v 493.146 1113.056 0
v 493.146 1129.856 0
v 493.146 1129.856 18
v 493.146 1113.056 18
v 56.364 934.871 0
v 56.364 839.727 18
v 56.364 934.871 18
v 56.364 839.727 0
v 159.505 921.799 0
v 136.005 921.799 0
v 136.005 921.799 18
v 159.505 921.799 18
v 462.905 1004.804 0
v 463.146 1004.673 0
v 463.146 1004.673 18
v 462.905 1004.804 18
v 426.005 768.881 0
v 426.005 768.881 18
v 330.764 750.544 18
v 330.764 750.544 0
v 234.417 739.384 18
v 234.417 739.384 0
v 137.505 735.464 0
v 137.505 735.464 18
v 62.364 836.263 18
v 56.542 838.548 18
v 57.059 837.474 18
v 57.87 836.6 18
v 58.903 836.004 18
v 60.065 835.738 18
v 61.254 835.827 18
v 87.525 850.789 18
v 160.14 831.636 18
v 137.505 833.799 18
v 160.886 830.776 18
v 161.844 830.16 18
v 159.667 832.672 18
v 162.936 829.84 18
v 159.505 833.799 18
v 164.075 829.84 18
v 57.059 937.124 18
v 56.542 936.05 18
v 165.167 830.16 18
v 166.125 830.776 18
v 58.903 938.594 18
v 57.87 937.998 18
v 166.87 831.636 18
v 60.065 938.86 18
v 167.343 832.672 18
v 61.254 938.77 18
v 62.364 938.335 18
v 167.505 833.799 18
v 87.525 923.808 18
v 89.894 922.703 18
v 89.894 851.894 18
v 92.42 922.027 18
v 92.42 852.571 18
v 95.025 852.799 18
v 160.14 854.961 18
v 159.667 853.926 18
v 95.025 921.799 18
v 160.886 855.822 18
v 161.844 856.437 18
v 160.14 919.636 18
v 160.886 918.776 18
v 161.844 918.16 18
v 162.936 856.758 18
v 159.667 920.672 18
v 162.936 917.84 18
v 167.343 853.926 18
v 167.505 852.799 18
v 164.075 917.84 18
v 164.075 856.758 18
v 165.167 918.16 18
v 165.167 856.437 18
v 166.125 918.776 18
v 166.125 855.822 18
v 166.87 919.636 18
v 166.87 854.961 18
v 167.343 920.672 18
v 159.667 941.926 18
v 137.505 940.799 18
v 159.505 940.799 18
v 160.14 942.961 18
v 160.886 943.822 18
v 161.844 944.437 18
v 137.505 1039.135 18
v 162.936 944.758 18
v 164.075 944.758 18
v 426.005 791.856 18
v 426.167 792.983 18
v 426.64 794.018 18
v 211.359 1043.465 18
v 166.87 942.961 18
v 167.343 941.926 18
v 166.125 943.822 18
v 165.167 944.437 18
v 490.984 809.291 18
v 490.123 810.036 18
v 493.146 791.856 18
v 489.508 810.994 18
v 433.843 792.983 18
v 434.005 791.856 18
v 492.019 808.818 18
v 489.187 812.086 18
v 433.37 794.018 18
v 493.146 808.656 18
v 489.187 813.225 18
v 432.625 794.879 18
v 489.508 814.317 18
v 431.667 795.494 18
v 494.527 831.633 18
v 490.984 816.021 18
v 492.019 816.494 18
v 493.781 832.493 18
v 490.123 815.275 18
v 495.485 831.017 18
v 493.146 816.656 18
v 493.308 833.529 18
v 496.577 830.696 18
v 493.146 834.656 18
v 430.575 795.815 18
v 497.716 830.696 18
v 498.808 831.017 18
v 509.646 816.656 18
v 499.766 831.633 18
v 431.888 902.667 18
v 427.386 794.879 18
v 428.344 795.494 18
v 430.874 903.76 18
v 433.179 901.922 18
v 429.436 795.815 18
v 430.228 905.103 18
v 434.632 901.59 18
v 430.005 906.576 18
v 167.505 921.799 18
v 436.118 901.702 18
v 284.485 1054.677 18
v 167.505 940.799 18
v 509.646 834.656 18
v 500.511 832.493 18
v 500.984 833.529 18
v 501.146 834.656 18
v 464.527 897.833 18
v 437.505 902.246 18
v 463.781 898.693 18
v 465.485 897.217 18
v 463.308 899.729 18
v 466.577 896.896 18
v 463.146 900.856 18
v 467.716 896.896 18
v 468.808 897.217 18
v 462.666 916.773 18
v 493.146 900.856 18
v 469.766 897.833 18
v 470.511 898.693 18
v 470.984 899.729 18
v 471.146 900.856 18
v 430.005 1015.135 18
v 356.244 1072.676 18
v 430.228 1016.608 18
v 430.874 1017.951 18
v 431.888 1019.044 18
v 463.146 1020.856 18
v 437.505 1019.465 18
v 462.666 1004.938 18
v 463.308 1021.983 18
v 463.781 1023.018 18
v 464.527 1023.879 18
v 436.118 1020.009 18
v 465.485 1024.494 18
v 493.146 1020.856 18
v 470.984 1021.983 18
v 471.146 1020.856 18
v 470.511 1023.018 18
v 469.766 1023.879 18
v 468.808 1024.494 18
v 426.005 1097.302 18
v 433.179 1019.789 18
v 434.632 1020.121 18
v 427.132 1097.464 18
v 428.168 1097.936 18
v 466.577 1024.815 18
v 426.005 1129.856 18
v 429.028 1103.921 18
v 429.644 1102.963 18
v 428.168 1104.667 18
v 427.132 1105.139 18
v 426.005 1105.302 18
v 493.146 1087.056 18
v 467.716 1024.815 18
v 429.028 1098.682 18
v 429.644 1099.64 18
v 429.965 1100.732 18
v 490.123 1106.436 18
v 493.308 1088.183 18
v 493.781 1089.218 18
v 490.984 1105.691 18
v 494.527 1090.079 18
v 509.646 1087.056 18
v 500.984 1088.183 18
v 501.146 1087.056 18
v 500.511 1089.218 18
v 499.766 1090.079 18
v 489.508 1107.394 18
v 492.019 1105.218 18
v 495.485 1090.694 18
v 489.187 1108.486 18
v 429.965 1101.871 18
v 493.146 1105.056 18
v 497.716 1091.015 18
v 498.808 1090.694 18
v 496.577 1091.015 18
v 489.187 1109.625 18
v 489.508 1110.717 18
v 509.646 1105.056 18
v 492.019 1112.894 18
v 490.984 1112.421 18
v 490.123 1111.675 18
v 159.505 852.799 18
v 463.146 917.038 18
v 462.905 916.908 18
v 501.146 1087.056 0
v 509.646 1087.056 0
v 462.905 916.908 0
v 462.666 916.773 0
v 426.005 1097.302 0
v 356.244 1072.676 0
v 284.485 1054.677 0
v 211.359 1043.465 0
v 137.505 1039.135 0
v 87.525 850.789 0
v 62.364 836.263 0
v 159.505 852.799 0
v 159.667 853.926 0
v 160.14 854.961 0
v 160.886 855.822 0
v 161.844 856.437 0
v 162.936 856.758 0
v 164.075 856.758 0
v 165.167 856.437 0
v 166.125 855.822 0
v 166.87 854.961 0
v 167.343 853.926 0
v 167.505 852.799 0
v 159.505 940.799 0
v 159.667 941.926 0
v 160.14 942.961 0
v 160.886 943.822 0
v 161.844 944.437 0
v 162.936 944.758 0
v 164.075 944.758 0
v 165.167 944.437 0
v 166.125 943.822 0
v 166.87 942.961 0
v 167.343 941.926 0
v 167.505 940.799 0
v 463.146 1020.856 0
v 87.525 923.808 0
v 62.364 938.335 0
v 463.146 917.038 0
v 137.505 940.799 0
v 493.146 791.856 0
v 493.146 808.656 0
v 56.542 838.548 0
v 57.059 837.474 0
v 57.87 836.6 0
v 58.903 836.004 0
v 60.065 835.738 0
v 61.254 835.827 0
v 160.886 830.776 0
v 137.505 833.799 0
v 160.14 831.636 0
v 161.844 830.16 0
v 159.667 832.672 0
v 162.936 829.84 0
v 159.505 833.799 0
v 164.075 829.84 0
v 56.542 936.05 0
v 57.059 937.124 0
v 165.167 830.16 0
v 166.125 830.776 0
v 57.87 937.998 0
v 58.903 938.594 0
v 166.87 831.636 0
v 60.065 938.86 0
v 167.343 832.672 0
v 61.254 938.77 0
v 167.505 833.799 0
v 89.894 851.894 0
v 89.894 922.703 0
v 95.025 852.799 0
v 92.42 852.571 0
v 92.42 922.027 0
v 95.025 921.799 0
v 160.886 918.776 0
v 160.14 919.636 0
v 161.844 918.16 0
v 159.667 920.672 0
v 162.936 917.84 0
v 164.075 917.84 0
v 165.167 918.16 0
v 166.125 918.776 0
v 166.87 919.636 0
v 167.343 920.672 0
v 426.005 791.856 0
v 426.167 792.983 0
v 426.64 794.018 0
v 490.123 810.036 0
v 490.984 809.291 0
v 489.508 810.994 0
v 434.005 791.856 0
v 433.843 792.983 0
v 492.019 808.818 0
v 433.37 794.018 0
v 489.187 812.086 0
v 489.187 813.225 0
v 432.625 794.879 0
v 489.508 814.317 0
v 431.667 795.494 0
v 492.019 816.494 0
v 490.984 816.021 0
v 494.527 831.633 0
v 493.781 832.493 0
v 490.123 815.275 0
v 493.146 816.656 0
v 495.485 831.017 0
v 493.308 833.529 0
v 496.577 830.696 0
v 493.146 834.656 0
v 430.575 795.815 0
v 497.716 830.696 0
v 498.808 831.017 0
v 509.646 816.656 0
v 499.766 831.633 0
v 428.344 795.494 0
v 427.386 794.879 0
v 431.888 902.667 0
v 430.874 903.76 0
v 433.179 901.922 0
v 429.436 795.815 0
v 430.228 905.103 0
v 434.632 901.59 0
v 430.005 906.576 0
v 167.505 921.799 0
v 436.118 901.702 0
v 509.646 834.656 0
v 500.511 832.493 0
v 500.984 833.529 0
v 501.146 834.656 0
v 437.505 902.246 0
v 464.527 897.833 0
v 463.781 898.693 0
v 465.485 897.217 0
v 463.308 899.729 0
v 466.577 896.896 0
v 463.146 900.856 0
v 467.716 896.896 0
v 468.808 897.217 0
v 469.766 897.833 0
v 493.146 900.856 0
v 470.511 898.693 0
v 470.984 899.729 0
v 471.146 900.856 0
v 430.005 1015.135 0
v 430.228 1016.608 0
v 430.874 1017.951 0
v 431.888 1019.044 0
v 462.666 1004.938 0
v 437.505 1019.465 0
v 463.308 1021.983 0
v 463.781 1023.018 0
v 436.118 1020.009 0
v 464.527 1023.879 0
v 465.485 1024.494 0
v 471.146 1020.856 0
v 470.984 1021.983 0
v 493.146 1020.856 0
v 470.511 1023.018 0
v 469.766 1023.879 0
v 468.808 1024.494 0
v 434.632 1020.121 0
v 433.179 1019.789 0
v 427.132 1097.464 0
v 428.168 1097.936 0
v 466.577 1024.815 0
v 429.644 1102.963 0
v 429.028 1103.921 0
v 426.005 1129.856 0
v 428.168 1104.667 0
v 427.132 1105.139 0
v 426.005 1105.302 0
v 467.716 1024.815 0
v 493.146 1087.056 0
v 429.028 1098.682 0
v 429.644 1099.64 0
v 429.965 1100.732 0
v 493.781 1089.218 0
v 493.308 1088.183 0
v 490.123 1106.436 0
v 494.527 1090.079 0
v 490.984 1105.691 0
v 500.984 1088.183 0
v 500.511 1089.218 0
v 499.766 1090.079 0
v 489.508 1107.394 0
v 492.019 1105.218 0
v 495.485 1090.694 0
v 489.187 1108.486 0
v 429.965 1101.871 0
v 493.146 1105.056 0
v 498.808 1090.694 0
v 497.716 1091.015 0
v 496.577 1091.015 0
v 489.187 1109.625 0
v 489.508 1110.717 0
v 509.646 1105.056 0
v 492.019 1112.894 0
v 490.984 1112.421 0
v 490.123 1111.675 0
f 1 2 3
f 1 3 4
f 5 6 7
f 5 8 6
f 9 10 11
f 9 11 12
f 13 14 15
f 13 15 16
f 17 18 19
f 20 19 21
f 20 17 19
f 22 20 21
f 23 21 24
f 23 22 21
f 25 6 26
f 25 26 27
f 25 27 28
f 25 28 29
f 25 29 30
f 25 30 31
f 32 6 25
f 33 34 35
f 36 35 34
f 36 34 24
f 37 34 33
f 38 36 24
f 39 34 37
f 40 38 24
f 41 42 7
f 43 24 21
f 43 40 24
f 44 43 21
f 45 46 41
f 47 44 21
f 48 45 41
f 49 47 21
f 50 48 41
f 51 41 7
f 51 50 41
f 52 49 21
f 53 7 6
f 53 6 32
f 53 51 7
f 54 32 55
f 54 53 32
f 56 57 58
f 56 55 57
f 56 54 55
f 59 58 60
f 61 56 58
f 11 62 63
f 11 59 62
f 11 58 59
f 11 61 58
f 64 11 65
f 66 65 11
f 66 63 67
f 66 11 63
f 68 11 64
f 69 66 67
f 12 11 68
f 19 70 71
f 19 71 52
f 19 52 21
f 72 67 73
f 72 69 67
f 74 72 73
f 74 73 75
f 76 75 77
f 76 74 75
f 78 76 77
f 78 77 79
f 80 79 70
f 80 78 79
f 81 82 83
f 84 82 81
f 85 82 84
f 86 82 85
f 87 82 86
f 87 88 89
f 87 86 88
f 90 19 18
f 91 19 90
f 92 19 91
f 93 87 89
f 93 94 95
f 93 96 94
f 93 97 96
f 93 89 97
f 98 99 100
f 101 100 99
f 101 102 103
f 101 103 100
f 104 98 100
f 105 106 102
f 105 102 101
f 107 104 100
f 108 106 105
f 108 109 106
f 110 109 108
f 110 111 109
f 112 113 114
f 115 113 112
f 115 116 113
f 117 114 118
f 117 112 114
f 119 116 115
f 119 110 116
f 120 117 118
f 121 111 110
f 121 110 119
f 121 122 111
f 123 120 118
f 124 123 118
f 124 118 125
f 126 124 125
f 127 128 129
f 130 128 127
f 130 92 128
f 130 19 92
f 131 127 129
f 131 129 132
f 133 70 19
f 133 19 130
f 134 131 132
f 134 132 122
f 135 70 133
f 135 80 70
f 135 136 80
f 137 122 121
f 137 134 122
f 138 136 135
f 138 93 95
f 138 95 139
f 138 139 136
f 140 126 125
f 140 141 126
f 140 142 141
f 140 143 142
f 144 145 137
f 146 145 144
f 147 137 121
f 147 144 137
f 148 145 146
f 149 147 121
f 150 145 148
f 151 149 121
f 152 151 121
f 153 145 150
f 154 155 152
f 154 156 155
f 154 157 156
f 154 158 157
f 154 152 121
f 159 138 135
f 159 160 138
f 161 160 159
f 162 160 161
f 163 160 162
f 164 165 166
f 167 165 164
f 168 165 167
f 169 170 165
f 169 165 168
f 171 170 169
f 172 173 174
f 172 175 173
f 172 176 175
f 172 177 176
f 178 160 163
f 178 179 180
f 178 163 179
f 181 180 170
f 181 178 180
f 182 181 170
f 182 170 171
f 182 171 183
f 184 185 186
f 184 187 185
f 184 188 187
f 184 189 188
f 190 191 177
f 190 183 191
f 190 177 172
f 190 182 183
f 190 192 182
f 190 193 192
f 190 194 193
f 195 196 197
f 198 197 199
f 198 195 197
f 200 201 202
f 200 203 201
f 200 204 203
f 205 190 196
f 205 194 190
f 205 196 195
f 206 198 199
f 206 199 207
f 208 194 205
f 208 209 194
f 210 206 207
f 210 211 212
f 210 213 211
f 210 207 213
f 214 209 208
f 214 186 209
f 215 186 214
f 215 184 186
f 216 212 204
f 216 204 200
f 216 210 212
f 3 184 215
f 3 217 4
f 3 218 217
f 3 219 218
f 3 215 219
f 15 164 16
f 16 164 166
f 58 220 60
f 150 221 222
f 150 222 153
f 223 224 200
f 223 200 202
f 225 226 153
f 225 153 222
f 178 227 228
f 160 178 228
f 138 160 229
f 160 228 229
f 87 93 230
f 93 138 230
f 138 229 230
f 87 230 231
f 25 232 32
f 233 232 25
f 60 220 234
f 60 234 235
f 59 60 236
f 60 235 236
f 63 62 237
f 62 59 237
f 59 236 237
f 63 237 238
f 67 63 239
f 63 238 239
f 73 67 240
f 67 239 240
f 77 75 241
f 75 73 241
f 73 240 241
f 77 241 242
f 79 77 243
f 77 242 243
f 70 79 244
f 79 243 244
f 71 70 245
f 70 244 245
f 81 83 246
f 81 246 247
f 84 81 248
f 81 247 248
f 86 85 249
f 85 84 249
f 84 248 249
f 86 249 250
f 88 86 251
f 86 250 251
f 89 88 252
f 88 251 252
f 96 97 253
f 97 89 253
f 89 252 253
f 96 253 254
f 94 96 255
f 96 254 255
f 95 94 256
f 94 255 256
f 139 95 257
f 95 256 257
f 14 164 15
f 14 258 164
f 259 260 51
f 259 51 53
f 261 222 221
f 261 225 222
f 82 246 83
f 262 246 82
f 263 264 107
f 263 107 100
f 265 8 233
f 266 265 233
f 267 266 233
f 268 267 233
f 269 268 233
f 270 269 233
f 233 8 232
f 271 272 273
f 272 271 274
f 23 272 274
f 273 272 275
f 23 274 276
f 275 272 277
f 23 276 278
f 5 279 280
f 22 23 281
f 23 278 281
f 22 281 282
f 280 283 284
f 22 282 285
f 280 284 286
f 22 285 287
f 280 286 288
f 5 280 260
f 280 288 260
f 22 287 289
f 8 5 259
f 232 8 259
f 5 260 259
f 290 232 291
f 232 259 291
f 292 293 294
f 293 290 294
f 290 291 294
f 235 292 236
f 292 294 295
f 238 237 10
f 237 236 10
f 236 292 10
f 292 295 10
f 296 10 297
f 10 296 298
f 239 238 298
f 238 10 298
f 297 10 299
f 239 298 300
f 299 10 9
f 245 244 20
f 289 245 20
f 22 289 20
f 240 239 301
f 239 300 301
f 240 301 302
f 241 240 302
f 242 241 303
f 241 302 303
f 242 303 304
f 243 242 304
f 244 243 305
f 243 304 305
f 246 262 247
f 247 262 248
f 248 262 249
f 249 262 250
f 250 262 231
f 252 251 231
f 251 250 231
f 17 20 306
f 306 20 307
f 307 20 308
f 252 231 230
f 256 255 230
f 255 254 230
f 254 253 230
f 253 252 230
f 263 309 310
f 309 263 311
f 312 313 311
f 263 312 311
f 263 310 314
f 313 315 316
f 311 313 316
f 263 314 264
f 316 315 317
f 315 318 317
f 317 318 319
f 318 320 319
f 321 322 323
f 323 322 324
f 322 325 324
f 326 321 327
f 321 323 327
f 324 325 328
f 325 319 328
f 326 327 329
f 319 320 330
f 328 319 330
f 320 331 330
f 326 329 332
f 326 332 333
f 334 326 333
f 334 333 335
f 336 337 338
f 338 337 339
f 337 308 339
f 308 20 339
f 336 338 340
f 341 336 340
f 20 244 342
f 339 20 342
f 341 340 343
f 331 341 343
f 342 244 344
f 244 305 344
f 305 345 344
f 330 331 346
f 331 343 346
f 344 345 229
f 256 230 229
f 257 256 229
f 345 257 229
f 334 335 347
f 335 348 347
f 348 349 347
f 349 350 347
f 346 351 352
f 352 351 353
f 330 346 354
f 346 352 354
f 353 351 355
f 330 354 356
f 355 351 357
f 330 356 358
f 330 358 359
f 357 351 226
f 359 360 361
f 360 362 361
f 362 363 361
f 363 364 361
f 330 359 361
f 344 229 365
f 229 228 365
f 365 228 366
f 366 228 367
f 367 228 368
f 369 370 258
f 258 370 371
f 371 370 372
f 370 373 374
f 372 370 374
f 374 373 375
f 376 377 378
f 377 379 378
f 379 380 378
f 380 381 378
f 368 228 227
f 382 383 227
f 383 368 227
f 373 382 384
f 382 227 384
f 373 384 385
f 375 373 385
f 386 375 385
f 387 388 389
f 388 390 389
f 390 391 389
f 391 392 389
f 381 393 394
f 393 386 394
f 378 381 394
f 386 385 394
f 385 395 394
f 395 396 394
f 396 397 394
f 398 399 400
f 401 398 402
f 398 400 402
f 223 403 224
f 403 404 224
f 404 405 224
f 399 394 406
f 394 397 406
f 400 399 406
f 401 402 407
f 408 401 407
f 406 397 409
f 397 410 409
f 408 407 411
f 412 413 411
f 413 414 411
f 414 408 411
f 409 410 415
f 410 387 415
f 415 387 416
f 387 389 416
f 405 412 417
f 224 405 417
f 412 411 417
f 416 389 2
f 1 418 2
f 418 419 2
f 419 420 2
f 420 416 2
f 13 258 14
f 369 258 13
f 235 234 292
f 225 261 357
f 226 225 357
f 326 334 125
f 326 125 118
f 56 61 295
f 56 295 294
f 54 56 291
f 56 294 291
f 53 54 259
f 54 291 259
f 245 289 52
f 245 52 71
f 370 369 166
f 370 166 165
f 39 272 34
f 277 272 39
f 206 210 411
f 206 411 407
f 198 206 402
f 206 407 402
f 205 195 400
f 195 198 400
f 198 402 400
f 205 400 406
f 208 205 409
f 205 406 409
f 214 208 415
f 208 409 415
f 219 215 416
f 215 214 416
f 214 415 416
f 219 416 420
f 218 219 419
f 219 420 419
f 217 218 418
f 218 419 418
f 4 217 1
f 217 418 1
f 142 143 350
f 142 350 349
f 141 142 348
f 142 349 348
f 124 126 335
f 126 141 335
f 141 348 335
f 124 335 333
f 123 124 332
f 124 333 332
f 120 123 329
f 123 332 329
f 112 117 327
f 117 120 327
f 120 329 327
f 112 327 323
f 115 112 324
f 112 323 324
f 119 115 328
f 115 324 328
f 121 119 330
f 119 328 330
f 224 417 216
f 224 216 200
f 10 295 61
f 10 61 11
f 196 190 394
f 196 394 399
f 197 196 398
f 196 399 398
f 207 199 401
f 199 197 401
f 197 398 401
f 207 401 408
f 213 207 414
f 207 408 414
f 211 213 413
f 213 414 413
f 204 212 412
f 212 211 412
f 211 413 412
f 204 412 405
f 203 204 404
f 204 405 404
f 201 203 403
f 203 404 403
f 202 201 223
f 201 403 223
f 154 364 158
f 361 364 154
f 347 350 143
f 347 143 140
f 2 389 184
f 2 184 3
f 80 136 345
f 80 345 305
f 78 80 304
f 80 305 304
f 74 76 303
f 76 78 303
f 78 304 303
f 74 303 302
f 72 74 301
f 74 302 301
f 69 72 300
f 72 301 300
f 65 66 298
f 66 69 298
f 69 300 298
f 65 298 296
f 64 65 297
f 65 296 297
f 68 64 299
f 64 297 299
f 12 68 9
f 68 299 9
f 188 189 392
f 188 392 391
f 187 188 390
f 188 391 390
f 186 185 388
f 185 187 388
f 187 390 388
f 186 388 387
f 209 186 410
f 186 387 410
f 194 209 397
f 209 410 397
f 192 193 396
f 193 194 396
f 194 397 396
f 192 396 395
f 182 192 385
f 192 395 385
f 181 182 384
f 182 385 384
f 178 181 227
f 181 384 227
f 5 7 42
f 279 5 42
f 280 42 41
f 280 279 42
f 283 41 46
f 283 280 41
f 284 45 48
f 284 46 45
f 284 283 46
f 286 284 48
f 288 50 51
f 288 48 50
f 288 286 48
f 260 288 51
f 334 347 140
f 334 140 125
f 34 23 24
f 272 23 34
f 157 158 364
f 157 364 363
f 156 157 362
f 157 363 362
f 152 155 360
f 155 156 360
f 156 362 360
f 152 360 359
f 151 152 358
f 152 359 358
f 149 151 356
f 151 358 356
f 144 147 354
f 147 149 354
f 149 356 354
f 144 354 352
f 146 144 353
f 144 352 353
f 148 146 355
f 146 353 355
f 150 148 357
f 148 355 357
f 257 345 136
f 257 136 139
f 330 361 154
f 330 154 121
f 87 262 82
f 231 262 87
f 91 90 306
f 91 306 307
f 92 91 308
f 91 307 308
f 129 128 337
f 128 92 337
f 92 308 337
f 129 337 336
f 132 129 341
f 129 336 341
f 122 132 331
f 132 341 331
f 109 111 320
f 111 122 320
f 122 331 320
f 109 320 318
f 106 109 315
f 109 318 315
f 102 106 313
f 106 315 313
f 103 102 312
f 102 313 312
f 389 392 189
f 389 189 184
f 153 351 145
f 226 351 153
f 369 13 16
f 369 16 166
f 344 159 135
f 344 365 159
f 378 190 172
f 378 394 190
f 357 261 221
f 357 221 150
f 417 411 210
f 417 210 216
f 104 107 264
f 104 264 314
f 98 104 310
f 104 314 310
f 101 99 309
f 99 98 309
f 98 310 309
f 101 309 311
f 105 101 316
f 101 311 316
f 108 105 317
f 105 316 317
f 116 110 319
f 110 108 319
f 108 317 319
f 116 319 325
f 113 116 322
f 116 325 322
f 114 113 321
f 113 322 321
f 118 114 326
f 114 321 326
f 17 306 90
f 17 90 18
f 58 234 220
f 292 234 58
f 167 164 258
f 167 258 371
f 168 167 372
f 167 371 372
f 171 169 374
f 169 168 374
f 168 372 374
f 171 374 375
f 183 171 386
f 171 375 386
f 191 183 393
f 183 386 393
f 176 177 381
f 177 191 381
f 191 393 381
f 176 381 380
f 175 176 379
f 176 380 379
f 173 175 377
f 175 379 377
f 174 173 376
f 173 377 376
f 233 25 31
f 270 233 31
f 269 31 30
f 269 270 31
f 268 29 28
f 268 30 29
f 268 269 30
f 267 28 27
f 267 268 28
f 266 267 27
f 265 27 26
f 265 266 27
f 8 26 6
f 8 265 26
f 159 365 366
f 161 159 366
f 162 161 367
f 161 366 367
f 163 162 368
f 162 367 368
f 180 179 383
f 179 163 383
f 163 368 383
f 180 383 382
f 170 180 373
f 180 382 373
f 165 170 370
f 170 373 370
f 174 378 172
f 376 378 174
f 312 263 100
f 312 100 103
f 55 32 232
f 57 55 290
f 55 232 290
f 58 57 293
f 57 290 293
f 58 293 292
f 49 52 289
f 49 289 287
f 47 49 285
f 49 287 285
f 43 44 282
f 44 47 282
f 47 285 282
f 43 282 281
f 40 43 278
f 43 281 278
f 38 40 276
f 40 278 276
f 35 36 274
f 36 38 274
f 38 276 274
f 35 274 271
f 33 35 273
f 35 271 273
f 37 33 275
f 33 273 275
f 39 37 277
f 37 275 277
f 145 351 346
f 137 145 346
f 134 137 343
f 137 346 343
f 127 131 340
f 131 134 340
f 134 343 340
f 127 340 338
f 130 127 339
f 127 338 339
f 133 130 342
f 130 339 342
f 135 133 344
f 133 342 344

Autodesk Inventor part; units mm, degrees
ref_plane "YZ Plane" through (0, 0, 0) normal (1, 0, 0) x (0, 1, 0)
ref_plane "XZ Plane" through (0, 0, 0) normal (0, 1, 0) x (-1, 0, 0)
ref_plane "XY Plane" through (0, 0, 0) normal (0, 0, 1) x (1, 0, 0)
sketch "CONTOURS" plane through (0, 0, 0) normal (0, 0, 1) x (1, 0, 0)
  arc A0 (167.5054, 852.7989) -> (159.5054, 852.7989) centre (163.5054, 852.7989) ccw
  line L0 (159.5054, 852.7989) -> (95.0246, 852.7989)
  arc A1 (95.0246, 852.7989) -> (87.5246, 850.7893) centre (95.0246, 837.7989) ccw
  line L1 (87.5246, 850.7893) -> (62.3643, 836.263)
  arc A2 (56.3643, 839.7271) -> (62.3643, 836.263) centre (60.3643, 839.7271) ccw
  line L2 (56.3643, 839.7271) -> (56.3643, 934.8707)
  arc A3 (62.3643, 938.3348) -> (56.3643, 934.8707) centre (60.3643, 934.8707) ccw
  line L3 (62.3643, 938.3348) -> (87.5246, 923.8085)
  arc A4 (87.5246, 923.8085) -> (95.0246, 921.7989) centre (95.0246, 936.7989) ccw
  line L4 (95.0246, 921.7989) -> (136.0054, 921.7989)
  line L5 (136.0054, 921.7989) -> (159.5054, 921.7989)
  arc A5 (159.5054, 921.7989) -> (167.5054, 921.7989) centre (163.5054, 921.7989) ccw
  line L6 (167.5054, 921.7989) -> (167.5054, 940.7989)
  arc A6 (167.5054, 940.7989) -> (159.5054, 940.7989) centre (163.5054, 940.7989) ccw
  line L7 (159.5054, 940.7989) -> (137.5054, 940.7989)
  line L8 (137.5054, 940.7989) -> (137.5054, 1039.1352)
  arc A7 (137.5054, 1039.1352) -> (426.0054, 1097.3015) centre (128.2106, 1829.7885) ccw
  arc A8 (426.0054, 1097.3015) -> (426.0054, 1105.3015) centre (426.0054, 1101.3015) ccw
  line L9 (426.0054, 1105.3015) -> (426.0054, 1129.8557)
  line L10 (426.0054, 1129.8557) -> (493.1464, 1129.8556)
  line L11 (493.1464, 1129.8556) -> (493.1464, 1113.0556)
  arc A9 (493.1464, 1113.0556) -> (493.1464, 1105.0556) centre (493.1464, 1109.0556) ccw
  line L12 (493.1464, 1105.0556) -> (509.6464, 1105.0556)
  line L13 (509.6464, 1105.0556) -> (509.6464, 1087.0556)
  line L14 (509.6464, 1087.0556) -> (501.1464, 1087.0556)
  arc A10 (501.1464, 1087.0556) -> (493.1464, 1087.0556) centre (497.1464, 1087.0556) ccw
  line L15 (493.1464, 1087.0556) -> (493.1464, 1020.8556)
  line L16 (493.1464, 1020.8556) -> (471.1464, 1020.8556)
  arc A11 (471.1464, 1020.8556) -> (463.1464, 1020.8556) centre (467.1464, 1020.8556) ccw
  line L17 (463.1464, 1020.8556) -> (463.1464, 1004.6734)
  line L18 (463.1464, 1004.6734) -> (462.9047, 1004.8036)
  line L19 (462.9047, 1004.8036) -> (462.6656, 1004.9385)
  line L20 (462.6656, 1004.9385) -> (437.5054, 1019.4648)
  arc A12 (437.5054, 1019.4648) -> (430.0054, 1015.1347) centre (435.0054, 1015.1347) ccw
  line L21 (430.0054, 1015.1347) -> (430.0054, 906.5765)
  arc A13 (430.0054, 906.5765) -> (437.5054, 902.2464) centre (435.0054, 906.5765) ccw
  line L22 (437.5054, 902.2464) -> (462.6656, 916.7727)
  line L23 (462.6656, 916.7727) -> (462.9047, 916.9076)
  line L24 (462.9047, 916.9076) -> (463.1464, 917.0378)
  line L25 (463.1464, 917.0378) -> (463.1464, 900.8556)
  arc A14 (463.1464, 900.8556) -> (471.1464, 900.8556) centre (467.1464, 900.8556) ccw
  line L26 (471.1464, 900.8556) -> (493.1464, 900.8556)
  line L27 (493.1464, 900.8556) -> (493.1464, 834.6556)
  arc A15 (493.1464, 834.6556) -> (501.1464, 834.6556) centre (497.1464, 834.6556) ccw
  line L28 (501.1464, 834.6556) -> (509.6464, 834.6556)
  line L29 (509.6464, 834.6556) -> (509.6464, 816.6556)
  line L30 (509.6464, 816.6556) -> (493.1464, 816.6556)
  arc A16 (493.1464, 816.6556) -> (493.1464, 808.6556) centre (493.1464, 812.6556) ccw
  line L31 (493.1464, 808.6556) -> (493.1464, 791.8557)
  line L32 (493.1464, 791.8557) -> (434.0054, 791.8557)
  arc A17 (434.0054, 791.8557) -> (426.0054, 791.8557) centre (430.0054, 791.8557) ccw
  line L33 (426.0054, 791.8557) -> (426.0054, 768.8809)
  arc A18 (137.5054, 735.4635) -> (426.0054, 768.8809) centre (133.6317, 2030.9546) ccw
  line L34 (137.5054, 735.4635) -> (137.5054, 833.7989)
  line L35 (137.5054, 833.7989) -> (159.5054, 833.7989)
  arc A19 (159.5054, 833.7989) -> (167.5054, 833.7989) centre (163.5054, 833.7989) ccw
  line L36 (167.5054, 833.7989) -> (167.5054, 852.7989)
sketch "LETTERS" plane through (0, 0, 0) normal (0, 0, 1) x (1, 0, 0)
  line L0 (285.7416, 916.5238) -> (285.9594, 916.4912)
  line L1 (285.9594, 916.4912) -> (286.1742, 916.4519)
  line L2 (286.1742, 916.4519) -> (286.386, 916.4061)
  line L3 (286.386, 916.4061) -> (286.5947, 916.3537)
  line L4 (286.5947, 916.3537) -> (286.8003, 916.2951)
  line L5 (286.8003, 916.2951) -> (287.0028, 916.2304)
  line L6 (287.0028, 916.2304) -> (287.2021, 916.1595)
  line L7 (287.2021, 916.1595) -> (287.3982, 916.0828)
  line L8 (287.3982, 916.0828) -> (287.5911, 916.0003)
  line L9 (287.5911, 916.0003) -> (287.7807, 915.9122)
  line L10 (287.7807, 915.9122) -> (287.967, 915.8185)
  line L11 (287.967, 915.8185) -> (288.1499, 915.7195)
  line L12 (288.1499, 915.7195) -> (288.3295, 915.6152)
  line L13 (288.3295, 915.6152) -> (288.5057, 915.5058)
  line L14 (288.5057, 915.5058) -> (288.6784, 915.3914)
  line L15 (288.6784, 915.3914) -> (288.8477, 915.2722)
  line L16 (288.8477, 915.2722) -> (289.0135, 915.1482)
  line L17 (289.0135, 915.1482) -> (289.1757, 915.0197)
  line L18 (289.1757, 915.0197) -> (289.3343, 914.8867)
  line L19 (289.3343, 914.8867) -> (289.4894, 914.7494)
  line L20 (289.4894, 914.7494) -> (289.6408, 914.6079)
  line L21 (289.6408, 914.6079) -> (289.7885, 914.4624)
  line L22 (289.7885, 914.4624) -> (289.9325, 914.3129)
  line L23 (289.9325, 914.3129) -> (290.0728, 914.1596)
  line L24 (290.0728, 914.1596) -> (290.2093, 914.0027)
  line L25 (290.2093, 914.0027) -> (290.3419, 913.8423)
  line L26 (290.3419, 913.8423) -> (290.4708, 913.6784)
  line L27 (290.4708, 913.6784) -> (290.5957, 913.5113)
  line L28 (290.5957, 913.5113) -> (290.7168, 913.3411)
  line L29 (290.7168, 913.3411) -> (290.8339, 913.1679)
  line L30 (290.8339, 913.1679) -> (290.947, 912.9918)
  line L31 (290.947, 912.9918) -> (291.0561, 912.813)
  line L32 (291.0561, 912.813) -> (291.1611, 912.6315)
  line L33 (291.1611, 912.6315) -> (291.2621, 912.4476)
  line L34 (291.2621, 912.4476) -> (291.359, 912.2614)
  line L35 (291.359, 912.2614) -> (291.4517, 912.073)
  line L36 (291.4517, 912.073) -> (291.5402, 911.8825)
  line L37 (291.5402, 911.8825) -> (291.6245, 911.69)
  line L38 (291.6245, 911.69) -> (291.7046, 911.4958)
  line L39 (291.7046, 911.4958) -> (291.7803, 911.2999)
  line L40 (291.7803, 911.2999) -> (291.8518, 911.1024)
  line L41 (291.8518, 911.1024) -> (291.9189, 910.9035)
  line L42 (291.9189, 910.9035) -> (291.9816, 910.7034)
  line L43 (291.9816, 910.7034) -> (292.0399, 910.5021)
  line L44 (292.0399, 910.5021) -> (292.0938, 910.2998)
  line L45 (292.0938, 910.2998) -> (292.1431, 910.0966)
  line L46 (292.1431, 910.0966) -> (292.1879, 909.8927)
  line L47 (292.1879, 909.8927) -> (292.2282, 909.6881)
  line L48 (292.2282, 909.6881) -> (292.2639, 909.4831)
  line L49 (292.2639, 909.4831) -> (292.295, 909.2777)
  line L50 (292.295, 909.2777) -> (292.3214, 909.0721)
  line L51 (292.3214, 909.0721) -> (292.3431, 908.8665)
  line L52 (292.3431, 908.8665) -> (292.3601, 908.6608)
  line L53 (292.3601, 908.6608) -> (292.3724, 908.4554)
  line L54 (292.3724, 908.4554) -> (292.3798, 908.2502)
  line L55 (292.3798, 908.2502) -> (292.3825, 908.0455)
  line L56 (292.3825, 908.0455) -> (292.3802, 907.8414)
  line L57 (292.3802, 907.8414) -> (292.3731, 907.638)
  line L58 (292.3731, 907.638) -> (292.3611, 907.4354)
  line L59 (292.3611, 907.4354) -> (292.3441, 907.2338)
  line L60 (292.3441, 907.2338) -> (292.3221, 907.0333)
  line L61 (292.3221, 907.0333) -> (292.295, 906.834)
  line L62 (292.295, 906.834) -> (292.2629, 906.6361)
  line L63 (292.2629, 906.6361) -> (292.2257, 906.4397)
  line L64 (292.2257, 906.4397) -> (292.1834, 906.2449)
  line L65 (292.1834, 906.2449) -> (292.1361, 906.0518)
  line L66 (292.1361, 906.0518) -> (292.0838, 905.8604)
  line L67 (292.0838, 905.8604) -> (292.0265, 905.6708)
  line L68 (292.0265, 905.6708) -> (291.9645, 905.483)
  line L69 (291.9645, 905.483) -> (291.8977, 905.297)
  line L70 (291.8977, 905.297) -> (291.8263, 905.1128)
  line L71 (291.8263, 905.1128) -> (291.7502, 904.9306)
  line L72 (291.7502, 904.9306) -> (291.6697, 904.7503)
  line L73 (291.6697, 904.7503) -> (291.5847, 904.5721)
  line L74 (291.5847, 904.5721) -> (291.4954, 904.3958)
  line L75 (291.4954, 904.3958) -> (291.4018, 904.2217)
  line L76 (291.4018, 904.2217) -> (291.304, 904.0496)
  line L77 (291.304, 904.0496) -> (291.2021, 903.8797)
  line L78 (291.2021, 903.8797) -> (291.0961, 903.712)
  line L79 (291.0961, 903.712) -> (290.9861, 903.5465)
  line L80 (290.9861, 903.5465) -> (290.8723, 903.3833)
  line L81 (290.8723, 903.3833) -> (290.7547, 903.2224)
  line L82 (290.7547, 903.2224) -> (290.6333, 903.0638)
  line L83 (290.6333, 903.0638) -> (290.5083, 902.9077)
  line L84 (290.5083, 902.9077) -> (290.3797, 902.754)
  line L85 (290.3797, 902.754) -> (290.2476, 902.6027)
  line L86 (290.2476, 902.6027) -> (290.112, 902.454)
  line L87 (290.112, 902.454) -> (289.9732, 902.3078)
  line L88 (289.9732, 902.3078) -> (289.831, 902.1642)
  line L89 (289.831, 902.1642) -> (289.6857, 902.0232)
  line L90 (289.6857, 902.0232) -> (289.5372, 901.8849)
  line L91 (289.5372, 901.8849) -> (289.3857, 901.7493)
  line L92 (289.3857, 901.7493) -> (289.2313, 901.6165)
  line L93 (289.2313, 901.6165) -> (289.0739, 901.4864)
  line L94 (289.0739, 901.4864) -> (288.9138, 901.3592)
  line L95 (288.9138, 901.3592) -> (288.7509, 901.2348)
  line L96 (288.7509, 901.2348) -> (288.5854, 901.1134)
  line L97 (288.5854, 901.1134) -> (288.4173, 900.9949)
  line L98 (288.4173, 900.9949) -> (288.2468, 900.8794)
  line L99 (288.2468, 900.8794) -> (288.0738, 900.7669)
  line L100 (288.0738, 900.7669) -> (287.8984, 900.6575)
  line L101 (287.8984, 900.6575) -> (287.7208, 900.5512)
  line L102 (287.7208, 900.5512) -> (287.5411, 900.448)
  line L103 (287.5411, 900.448) -> (287.3592, 900.348)
  line L104 (287.3592, 900.348) -> (287.1753, 900.2513)
  line L105 (287.1753, 900.2513) -> (286.9894, 900.1578)
  line L106 (286.9894, 900.1578) -> (286.8017, 900.0677)
  line L107 (286.8017, 900.0677) -> (286.6121, 899.9808)
  line L108 (286.6121, 899.9808) -> (286.4209, 899.8974)
  line L109 (286.228, 899.8174) -> (286.0335, 899.7409)
  line L110 (286.0335, 899.7409) -> (285.8375, 899.6679)
  line L111 (285.8375, 899.6679) -> (285.6402, 899.5984)
  line L112 (285.6402, 899.5984) -> (285.4415, 899.5325)
  line L113 (285.4415, 899.5325) -> (285.2415, 899.4703)
  line L114 (285.2415, 899.4703) -> (285.0404, 899.4117)
  line L115 (285.0404, 899.4117) -> (284.8382, 899.3568)
  line L116 (284.8382, 899.3568) -> (284.635, 899.3057)
  line L117 (284.635, 899.3057) -> (284.4308, 899.2583)
  line L118 (284.4308, 899.2583) -> (284.2257, 899.2148)
  line L119 (284.2257, 899.2148) -> (284.0199, 899.1751)
  line L120 (284.0199, 899.1751) -> (283.8133, 899.1394)
  line L121 (283.8133, 899.1394) -> (283.6061, 899.1076)
  line L122 (283.6061, 899.1076) -> (283.3984, 899.0797)
  line L123 (283.3984, 899.0797) -> (283.1902, 899.0559)
  line L124 (283.1902, 899.0559) -> (282.9815, 899.0362)
  line L125 (282.9815, 899.0362) -> (282.7726, 899.0206)
  line L126 (282.7726, 899.0206) -> (282.5634, 899.0091)
  line L127 (282.5634, 899.0091) -> (282.354, 899.0018)
  line L128 (282.354, 899.0018) -> (282.1446, 898.9986)
  line L129 (282.1446, 898.9986) -> (281.9351, 898.9995)
  line L130 (281.9351, 898.9995) -> (281.7257, 899.0046)
  line L131 (281.7257, 899.0046) -> (281.5165, 899.0137)
  line L132 (281.5165, 899.0137) -> (281.3075, 899.0268)
  line L133 (281.3075, 899.0268) -> (281.0987, 899.0439)
  line L134 (281.0987, 899.0439) -> (280.8904, 899.065)
  line L135 (280.8904, 899.065) -> (280.6825, 899.09)
  line L136 (280.6825, 899.09) -> (280.4751, 899.1189)
  line L137 (280.4751, 899.1189) -> (280.2683, 899.1517)
  line L138 (280.2683, 899.1517) -> (280.0623, 899.1883)
  line L139 (280.0623, 899.1883) -> (279.8569, 899.2287)
  line L140 (279.8569, 899.2287) -> (279.6525, 899.2729)
  line L141 (279.6525, 899.2729) -> (279.4489, 899.3208)
  line L142 (279.4489, 899.3208) -> (279.2464, 899.3724)
  line L143 (279.2464, 899.3724) -> (279.0449, 899.4277)
  line L144 (279.0449, 899.4277) -> (278.8446, 899.4866)
  line L145 (278.8446, 899.4866) -> (278.6455, 899.5491)
  line L146 (278.6455, 899.5491) -> (278.4478, 899.6153)
  line L147 (278.4478, 899.6153) -> (278.2514, 899.6849)
  line L148 (278.2514, 899.6849) -> (278.0565, 899.7581)
  line L149 (278.0565, 899.7581) -> (277.8631, 899.8348)
  line L150 (277.8631, 899.8348) -> (277.6714, 899.9149)
  line L151 (277.6714, 899.9149) -> (277.4813, 899.9985)
  line L152 (277.4813, 899.9985) -> (277.2931, 900.0854)
  line L153 (277.2931, 900.0854) -> (277.1067, 900.1757)
  line L154 (277.1067, 900.1757) -> (276.9222, 900.2693)
  line L155 (276.9222, 900.2693) -> (276.7397, 900.3662)
  line L156 (276.7397, 900.3662) -> (276.5594, 900.4664)
  line L157 (276.5594, 900.4664) -> (276.3812, 900.5698)
  line L158 (276.3812, 900.5698) -> (276.2052, 900.6764)
  line L159 (276.2052, 900.6764) -> (276.0316, 900.7861)
  line L160 (276.0316, 900.7861) -> (275.8604, 900.899)
  line L161 (275.8604, 900.899) -> (275.6916, 901.015)
  line L162 (275.6916, 901.015) -> (275.5254, 901.1341)
  line L163 (275.5254, 901.1341) -> (275.3619, 901.2562)
  line L164 (275.3619, 901.2562) -> (275.201, 901.3813)
  line L165 (275.201, 901.3813) -> (275.043, 901.5094)
  line L166 (275.043, 901.5094) -> (274.8878, 901.6405)
  line L167 (274.8878, 901.6405) -> (274.7355, 901.7744)
  line L168 (274.7355, 901.7744) -> (274.5863, 901.9113)
  line L169 (274.5863, 901.9113) -> (274.4402, 902.0509)
  line L170 (274.4402, 902.0509) -> (274.2973, 902.1934)
  line L171 (274.2973, 902.1934) -> (274.1576, 902.3387)
  line L172 (274.1576, 902.3387) -> (274.0213, 902.4868)
  line L173 (274.0213, 902.4868) -> (273.8883, 902.6375)
  line L174 (273.8883, 902.6375) -> (273.7589, 902.791)
  line L175 (273.7589, 902.791) -> (273.633, 902.9471)
  line L176 (273.633, 902.9471) -> (273.5108, 903.1058)
  line L177 (273.5108, 903.1058) -> (273.3923, 903.2671)
  line L178 (273.3923, 903.2671) -> (273.2777, 903.431)
  line L179 (273.2777, 903.431) -> (273.1669, 903.5974)
  line L180 (273.1669, 903.5974) -> (273.06, 903.7664)
  line L181 (273.06, 903.7664) -> (272.9572, 903.9378)
  line L182 (272.9572, 903.9378) -> (272.8585, 904.1116)
  line L183 (272.8585, 904.1116) -> (272.764, 904.2878)
  line L184 (272.764, 904.2878) -> (272.6738, 904.4664)
  line L185 (272.6738, 904.4664) -> (272.5879, 904.6473)
  line L186 (272.5879, 904.6473) -> (272.5065, 904.8306)
  line L187 (272.5065, 904.8306) -> (272.4295, 905.0161)
  line L188 (272.4295, 905.0161) -> (272.3572, 905.2039)
  line L189 (272.3572, 905.2039) -> (272.2895, 905.3938)
  line L190 (272.2895, 905.3938) -> (272.2265, 905.586)
  line L191 (272.2265, 905.586) -> (272.1683, 905.7803)
  line L192 (272.1683, 905.7803) -> (272.115, 905.9766)
  line L193 (272.115, 905.9766) -> (272.0664, 906.1748)
  line L194 (272.0664, 906.1748) -> (272.0226, 906.3747)
  line L195 (272.0226, 906.3747) -> (271.9836, 906.5761)
  line L196 (271.9836, 906.5761) -> (271.9493, 906.7791)
  line L197 (271.9493, 906.7791) -> (271.9198, 906.9833)
  line L198 (271.9198, 906.9833) -> (271.8949, 907.1887)
  line L199 (271.8949, 907.1887) -> (271.8748, 907.3951)
  line L200 (271.8748, 907.3951) -> (271.8594, 907.6024)
  line L201 (271.8594, 907.6024) -> (271.8487, 907.8104)
  line L202 (271.8487, 907.8104) -> (271.8426, 908.019)
  line L203 (271.8426, 908.019) -> (271.8413, 908.2281)
  line L204 (271.8413, 908.2281) -> (271.8445, 908.4375)
  line L205 (271.8445, 908.4375) -> (271.8524, 908.6471)
  line L206 (271.8524, 908.6471) -> (271.8649, 908.8567)
  line L207 (271.8649, 908.8567) -> (271.882, 909.0662)
  line L208 (271.882, 909.0662) -> (271.9037, 909.2754)
  line L209 (271.9037, 909.2754) -> (271.93, 909.4843)
  line L210 (271.93, 909.4843) -> (271.9609, 909.6926)
  line L211 (271.9609, 909.6926) -> (271.9963, 909.9003)
  line L212 (271.9963, 909.9003) -> (272.0363, 910.1071)
  line L213 (272.0363, 910.1071) -> (272.0807, 910.313)
  line L214 (272.0807, 910.313) -> (272.1298, 910.5178)
  line L215 (272.1298, 910.5178) -> (272.1833, 910.7213)
  line L216 (272.1833, 910.7213) -> (272.2412, 910.9235)
  line L217 (272.2412, 910.9235) -> (272.3037, 911.1242)
  line L218 (272.3037, 911.1242) -> (272.3706, 911.3232)
  line L219 (272.3706, 911.3232) -> (272.442, 911.5204)
  line L220 (272.442, 911.5204) -> (272.5179, 911.7157)
  line L221 (272.5179, 911.7157) -> (272.5981, 911.9089)
  line L222 (272.5981, 911.9089) -> (272.6828, 912.0998)
  line L223 (272.6828, 912.0998) -> (272.7718, 912.2884)
  line L224 (272.7718, 912.2884) -> (272.8652, 912.4745)
  line L225 (272.8652, 912.4745) -> (272.9631, 912.6579)
  line L226 (272.9631, 912.6579) -> (273.0652, 912.8386)
  line L227 (273.0652, 912.8386) -> (273.1717, 913.0163)
  line L228 (273.1717, 913.0163) -> (273.2826, 913.191)
  line L229 (273.2826, 913.191) -> (273.3978, 913.3624)
  line L230 (273.3978, 913.3624) -> (273.5172, 913.5305)
  line L231 (273.5172, 913.5305) -> (273.641, 913.6951)
  line L232 (273.641, 913.6951) -> (273.7691, 913.8561)
  line L233 (273.7691, 913.8561) -> (273.9014, 914.0133)
  line L234 (273.9014, 914.0133) -> (274.038, 914.1666)
  line L235 (274.038, 914.1666) -> (274.1788, 914.3158)
  line L236 (274.1788, 914.3158) -> (274.3238, 914.4608)
  line L237 (274.3238, 914.4608) -> (274.4731, 914.6015)
  line L238 (274.4731, 914.6015) -> (274.6265, 914.7377)
  line L239 (274.6265, 914.7377) -> (274.7842, 914.8693)
  line L240 (274.7842, 914.8693) -> (274.946, 914.9961)
  line L241 (274.946, 914.9961) -> (275.112, 915.118)
  line L242 (275.112, 915.118) -> (275.2821, 915.2349)
  line L243 (275.2821, 915.2349) -> (275.4564, 915.3466)
  line L244 (275.4564, 915.3466) -> (275.6348, 915.453)
  line L245 (275.6348, 915.453) -> (275.8173, 915.5538)
  line L246 (275.8173, 915.5538) -> (276.0039, 915.6491)
  line L247 (276.0039, 915.6491) -> (276.1946, 915.7387)
  line L248 (276.1946, 915.7387) -> (276.3894, 915.8223)
  line L249 (276.3894, 915.8223) -> (276.5882, 915.8999)
  line L250 (276.5882, 915.8999) -> (276.7911, 915.9713)
  line L251 (276.7911, 915.9713) -> (276.998, 916.0365)
  line L252 (276.998, 916.0365) -> (277.2089, 916.0951)
  line L253 (277.2089, 916.0951) -> (277.4238, 916.1472)
  line L254 (277.4238, 916.1472) -> (277.6428, 916.1925)
  line L255 (286.4209, 899.8974) -> (286.228, 899.8174)
extrude "Extrusion1" add sketch "CONTOURS" along normal blind 18
properties part number "Support C" material "Wood (Birch)"
